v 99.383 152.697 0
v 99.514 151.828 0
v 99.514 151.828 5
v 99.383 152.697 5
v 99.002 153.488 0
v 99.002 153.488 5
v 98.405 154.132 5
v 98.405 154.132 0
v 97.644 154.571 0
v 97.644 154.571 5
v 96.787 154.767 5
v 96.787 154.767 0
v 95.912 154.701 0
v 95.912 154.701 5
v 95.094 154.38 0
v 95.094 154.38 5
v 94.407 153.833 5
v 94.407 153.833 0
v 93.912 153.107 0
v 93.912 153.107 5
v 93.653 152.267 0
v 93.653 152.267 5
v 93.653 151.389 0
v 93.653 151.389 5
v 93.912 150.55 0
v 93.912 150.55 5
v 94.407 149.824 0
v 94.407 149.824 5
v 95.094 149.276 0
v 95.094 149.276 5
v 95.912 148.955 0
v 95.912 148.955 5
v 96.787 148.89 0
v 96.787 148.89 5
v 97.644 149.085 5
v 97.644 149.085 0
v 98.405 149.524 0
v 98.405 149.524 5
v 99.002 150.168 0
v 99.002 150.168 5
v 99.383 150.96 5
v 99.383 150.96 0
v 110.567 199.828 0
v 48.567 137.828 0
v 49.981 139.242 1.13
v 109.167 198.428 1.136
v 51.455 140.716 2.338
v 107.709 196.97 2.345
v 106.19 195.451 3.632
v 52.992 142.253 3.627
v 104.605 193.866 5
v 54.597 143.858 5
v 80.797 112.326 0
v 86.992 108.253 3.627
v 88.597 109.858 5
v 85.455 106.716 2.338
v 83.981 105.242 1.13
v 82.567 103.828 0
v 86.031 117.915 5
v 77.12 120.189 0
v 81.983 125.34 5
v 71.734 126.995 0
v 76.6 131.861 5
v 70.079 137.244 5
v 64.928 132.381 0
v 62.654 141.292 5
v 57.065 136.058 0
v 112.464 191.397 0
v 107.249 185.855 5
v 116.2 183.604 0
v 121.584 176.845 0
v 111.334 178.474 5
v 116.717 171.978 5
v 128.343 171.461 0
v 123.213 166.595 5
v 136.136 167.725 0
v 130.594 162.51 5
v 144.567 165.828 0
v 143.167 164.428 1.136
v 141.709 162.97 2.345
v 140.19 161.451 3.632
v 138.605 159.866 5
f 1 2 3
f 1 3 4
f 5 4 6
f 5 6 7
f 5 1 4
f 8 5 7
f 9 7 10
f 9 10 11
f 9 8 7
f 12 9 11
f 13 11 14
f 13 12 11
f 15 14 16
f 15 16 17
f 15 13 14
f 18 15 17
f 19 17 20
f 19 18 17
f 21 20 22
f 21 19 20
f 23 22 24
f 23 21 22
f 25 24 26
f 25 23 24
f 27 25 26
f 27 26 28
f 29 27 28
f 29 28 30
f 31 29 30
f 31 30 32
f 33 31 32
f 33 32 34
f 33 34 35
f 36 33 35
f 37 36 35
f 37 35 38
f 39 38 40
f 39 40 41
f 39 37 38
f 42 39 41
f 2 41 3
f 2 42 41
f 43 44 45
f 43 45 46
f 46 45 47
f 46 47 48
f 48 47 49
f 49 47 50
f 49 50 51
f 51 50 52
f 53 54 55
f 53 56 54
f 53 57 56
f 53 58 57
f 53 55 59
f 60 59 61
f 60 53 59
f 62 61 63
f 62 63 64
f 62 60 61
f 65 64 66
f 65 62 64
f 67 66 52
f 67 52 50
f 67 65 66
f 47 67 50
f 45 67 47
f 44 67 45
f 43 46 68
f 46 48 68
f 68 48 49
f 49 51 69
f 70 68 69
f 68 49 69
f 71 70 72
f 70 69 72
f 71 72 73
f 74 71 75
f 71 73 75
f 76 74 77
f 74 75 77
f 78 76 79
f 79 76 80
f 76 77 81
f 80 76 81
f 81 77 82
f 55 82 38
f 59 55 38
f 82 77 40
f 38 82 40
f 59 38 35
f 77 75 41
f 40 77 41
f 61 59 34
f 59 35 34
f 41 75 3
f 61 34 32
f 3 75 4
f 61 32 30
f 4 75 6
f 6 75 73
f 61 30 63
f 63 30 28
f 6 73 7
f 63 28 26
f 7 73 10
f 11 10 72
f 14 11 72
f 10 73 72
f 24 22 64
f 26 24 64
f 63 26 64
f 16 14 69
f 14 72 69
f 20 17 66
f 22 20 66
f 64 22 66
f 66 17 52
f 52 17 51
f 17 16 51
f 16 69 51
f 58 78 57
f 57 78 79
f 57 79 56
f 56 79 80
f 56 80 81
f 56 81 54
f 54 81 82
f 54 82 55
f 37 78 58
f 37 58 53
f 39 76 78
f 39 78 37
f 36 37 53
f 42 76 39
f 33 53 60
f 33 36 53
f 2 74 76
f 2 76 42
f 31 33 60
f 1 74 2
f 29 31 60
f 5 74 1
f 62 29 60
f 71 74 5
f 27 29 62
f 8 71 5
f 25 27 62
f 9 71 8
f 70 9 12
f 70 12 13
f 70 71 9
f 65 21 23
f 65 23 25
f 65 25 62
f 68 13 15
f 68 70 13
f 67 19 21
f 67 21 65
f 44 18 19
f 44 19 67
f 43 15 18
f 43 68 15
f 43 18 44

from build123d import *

# Parameters (mm, degrees)
SKETCH3_R           = 2.94685624
BOSS_EXTRUDE1_DEPTH = 5
CHAMFER1_SIZE2      = 6.881909602
CHAMFER1_SIZE       = 5
CHAMFER2_SIZE2      = 5
CHAMFER2_SIZE       = 6.881909602


with BuildPart() as part:
    # Sketch3 → Boss-Extrude1 (new body)
    with BuildSketch(Plane.XY):
        with BuildLine():
            Line((48.567273068, 137.828283654), (110.567273068, 199.828283654))
            ThreePointArc((110.567273068, 199.828283654), (121.583561944, 176.84457253), (144.567273068, 165.828283654))
            Line((144.567273068, 165.828283654), (82.567273068, 103.828283654))
            ThreePointArc((82.567273068, 103.828283654), (71.734296399, 126.995306985), (48.567273068, 137.828283654))
        make_face()
        with Locations((96.567273068, 151.828283654)):
            Circle(SKETCH3_R, mode=Mode.SUBTRACT)
    extrude(amount=BOSS_EXTRUDE1_DEPTH)

    # Chamfer1
    chamfer1_edges = [part.edges().sort_by_distance(p)[0] for p in [
        (121.583561944, 176.84457253, 5),
    ]]
    chamfer1_side = [part.faces().sort_by_distance(p)[0] for p in [
        (121.583561944, 176.84457253, 4.9),
    ]]
    chamfer(chamfer1_edges, length=CHAMFER1_SIZE - 0.0001, length2=CHAMFER1_SIZE2 - 0.0001, reference=chamfer1_side[0])  # a hair under: the kernel refuses the full size

    # Chamfer2
    chamfer2_edges = [part.edges().sort_by_distance(p)[0] for p in [
        (71.734296399, 126.995306985, 5),
    ]]
    chamfer2_side = [part.faces().sort_by_distance(p)[0] for p in [
        (71.805007077, 127.066017663, 5),
    ]]
    chamfer(chamfer2_edges, length=CHAMFER2_SIZE - 0.0001, length2=CHAMFER2_SIZE2 - 0.0001, reference=chamfer2_side[0])  # a hair under: the kernel refuses the full size


solid = part.part
